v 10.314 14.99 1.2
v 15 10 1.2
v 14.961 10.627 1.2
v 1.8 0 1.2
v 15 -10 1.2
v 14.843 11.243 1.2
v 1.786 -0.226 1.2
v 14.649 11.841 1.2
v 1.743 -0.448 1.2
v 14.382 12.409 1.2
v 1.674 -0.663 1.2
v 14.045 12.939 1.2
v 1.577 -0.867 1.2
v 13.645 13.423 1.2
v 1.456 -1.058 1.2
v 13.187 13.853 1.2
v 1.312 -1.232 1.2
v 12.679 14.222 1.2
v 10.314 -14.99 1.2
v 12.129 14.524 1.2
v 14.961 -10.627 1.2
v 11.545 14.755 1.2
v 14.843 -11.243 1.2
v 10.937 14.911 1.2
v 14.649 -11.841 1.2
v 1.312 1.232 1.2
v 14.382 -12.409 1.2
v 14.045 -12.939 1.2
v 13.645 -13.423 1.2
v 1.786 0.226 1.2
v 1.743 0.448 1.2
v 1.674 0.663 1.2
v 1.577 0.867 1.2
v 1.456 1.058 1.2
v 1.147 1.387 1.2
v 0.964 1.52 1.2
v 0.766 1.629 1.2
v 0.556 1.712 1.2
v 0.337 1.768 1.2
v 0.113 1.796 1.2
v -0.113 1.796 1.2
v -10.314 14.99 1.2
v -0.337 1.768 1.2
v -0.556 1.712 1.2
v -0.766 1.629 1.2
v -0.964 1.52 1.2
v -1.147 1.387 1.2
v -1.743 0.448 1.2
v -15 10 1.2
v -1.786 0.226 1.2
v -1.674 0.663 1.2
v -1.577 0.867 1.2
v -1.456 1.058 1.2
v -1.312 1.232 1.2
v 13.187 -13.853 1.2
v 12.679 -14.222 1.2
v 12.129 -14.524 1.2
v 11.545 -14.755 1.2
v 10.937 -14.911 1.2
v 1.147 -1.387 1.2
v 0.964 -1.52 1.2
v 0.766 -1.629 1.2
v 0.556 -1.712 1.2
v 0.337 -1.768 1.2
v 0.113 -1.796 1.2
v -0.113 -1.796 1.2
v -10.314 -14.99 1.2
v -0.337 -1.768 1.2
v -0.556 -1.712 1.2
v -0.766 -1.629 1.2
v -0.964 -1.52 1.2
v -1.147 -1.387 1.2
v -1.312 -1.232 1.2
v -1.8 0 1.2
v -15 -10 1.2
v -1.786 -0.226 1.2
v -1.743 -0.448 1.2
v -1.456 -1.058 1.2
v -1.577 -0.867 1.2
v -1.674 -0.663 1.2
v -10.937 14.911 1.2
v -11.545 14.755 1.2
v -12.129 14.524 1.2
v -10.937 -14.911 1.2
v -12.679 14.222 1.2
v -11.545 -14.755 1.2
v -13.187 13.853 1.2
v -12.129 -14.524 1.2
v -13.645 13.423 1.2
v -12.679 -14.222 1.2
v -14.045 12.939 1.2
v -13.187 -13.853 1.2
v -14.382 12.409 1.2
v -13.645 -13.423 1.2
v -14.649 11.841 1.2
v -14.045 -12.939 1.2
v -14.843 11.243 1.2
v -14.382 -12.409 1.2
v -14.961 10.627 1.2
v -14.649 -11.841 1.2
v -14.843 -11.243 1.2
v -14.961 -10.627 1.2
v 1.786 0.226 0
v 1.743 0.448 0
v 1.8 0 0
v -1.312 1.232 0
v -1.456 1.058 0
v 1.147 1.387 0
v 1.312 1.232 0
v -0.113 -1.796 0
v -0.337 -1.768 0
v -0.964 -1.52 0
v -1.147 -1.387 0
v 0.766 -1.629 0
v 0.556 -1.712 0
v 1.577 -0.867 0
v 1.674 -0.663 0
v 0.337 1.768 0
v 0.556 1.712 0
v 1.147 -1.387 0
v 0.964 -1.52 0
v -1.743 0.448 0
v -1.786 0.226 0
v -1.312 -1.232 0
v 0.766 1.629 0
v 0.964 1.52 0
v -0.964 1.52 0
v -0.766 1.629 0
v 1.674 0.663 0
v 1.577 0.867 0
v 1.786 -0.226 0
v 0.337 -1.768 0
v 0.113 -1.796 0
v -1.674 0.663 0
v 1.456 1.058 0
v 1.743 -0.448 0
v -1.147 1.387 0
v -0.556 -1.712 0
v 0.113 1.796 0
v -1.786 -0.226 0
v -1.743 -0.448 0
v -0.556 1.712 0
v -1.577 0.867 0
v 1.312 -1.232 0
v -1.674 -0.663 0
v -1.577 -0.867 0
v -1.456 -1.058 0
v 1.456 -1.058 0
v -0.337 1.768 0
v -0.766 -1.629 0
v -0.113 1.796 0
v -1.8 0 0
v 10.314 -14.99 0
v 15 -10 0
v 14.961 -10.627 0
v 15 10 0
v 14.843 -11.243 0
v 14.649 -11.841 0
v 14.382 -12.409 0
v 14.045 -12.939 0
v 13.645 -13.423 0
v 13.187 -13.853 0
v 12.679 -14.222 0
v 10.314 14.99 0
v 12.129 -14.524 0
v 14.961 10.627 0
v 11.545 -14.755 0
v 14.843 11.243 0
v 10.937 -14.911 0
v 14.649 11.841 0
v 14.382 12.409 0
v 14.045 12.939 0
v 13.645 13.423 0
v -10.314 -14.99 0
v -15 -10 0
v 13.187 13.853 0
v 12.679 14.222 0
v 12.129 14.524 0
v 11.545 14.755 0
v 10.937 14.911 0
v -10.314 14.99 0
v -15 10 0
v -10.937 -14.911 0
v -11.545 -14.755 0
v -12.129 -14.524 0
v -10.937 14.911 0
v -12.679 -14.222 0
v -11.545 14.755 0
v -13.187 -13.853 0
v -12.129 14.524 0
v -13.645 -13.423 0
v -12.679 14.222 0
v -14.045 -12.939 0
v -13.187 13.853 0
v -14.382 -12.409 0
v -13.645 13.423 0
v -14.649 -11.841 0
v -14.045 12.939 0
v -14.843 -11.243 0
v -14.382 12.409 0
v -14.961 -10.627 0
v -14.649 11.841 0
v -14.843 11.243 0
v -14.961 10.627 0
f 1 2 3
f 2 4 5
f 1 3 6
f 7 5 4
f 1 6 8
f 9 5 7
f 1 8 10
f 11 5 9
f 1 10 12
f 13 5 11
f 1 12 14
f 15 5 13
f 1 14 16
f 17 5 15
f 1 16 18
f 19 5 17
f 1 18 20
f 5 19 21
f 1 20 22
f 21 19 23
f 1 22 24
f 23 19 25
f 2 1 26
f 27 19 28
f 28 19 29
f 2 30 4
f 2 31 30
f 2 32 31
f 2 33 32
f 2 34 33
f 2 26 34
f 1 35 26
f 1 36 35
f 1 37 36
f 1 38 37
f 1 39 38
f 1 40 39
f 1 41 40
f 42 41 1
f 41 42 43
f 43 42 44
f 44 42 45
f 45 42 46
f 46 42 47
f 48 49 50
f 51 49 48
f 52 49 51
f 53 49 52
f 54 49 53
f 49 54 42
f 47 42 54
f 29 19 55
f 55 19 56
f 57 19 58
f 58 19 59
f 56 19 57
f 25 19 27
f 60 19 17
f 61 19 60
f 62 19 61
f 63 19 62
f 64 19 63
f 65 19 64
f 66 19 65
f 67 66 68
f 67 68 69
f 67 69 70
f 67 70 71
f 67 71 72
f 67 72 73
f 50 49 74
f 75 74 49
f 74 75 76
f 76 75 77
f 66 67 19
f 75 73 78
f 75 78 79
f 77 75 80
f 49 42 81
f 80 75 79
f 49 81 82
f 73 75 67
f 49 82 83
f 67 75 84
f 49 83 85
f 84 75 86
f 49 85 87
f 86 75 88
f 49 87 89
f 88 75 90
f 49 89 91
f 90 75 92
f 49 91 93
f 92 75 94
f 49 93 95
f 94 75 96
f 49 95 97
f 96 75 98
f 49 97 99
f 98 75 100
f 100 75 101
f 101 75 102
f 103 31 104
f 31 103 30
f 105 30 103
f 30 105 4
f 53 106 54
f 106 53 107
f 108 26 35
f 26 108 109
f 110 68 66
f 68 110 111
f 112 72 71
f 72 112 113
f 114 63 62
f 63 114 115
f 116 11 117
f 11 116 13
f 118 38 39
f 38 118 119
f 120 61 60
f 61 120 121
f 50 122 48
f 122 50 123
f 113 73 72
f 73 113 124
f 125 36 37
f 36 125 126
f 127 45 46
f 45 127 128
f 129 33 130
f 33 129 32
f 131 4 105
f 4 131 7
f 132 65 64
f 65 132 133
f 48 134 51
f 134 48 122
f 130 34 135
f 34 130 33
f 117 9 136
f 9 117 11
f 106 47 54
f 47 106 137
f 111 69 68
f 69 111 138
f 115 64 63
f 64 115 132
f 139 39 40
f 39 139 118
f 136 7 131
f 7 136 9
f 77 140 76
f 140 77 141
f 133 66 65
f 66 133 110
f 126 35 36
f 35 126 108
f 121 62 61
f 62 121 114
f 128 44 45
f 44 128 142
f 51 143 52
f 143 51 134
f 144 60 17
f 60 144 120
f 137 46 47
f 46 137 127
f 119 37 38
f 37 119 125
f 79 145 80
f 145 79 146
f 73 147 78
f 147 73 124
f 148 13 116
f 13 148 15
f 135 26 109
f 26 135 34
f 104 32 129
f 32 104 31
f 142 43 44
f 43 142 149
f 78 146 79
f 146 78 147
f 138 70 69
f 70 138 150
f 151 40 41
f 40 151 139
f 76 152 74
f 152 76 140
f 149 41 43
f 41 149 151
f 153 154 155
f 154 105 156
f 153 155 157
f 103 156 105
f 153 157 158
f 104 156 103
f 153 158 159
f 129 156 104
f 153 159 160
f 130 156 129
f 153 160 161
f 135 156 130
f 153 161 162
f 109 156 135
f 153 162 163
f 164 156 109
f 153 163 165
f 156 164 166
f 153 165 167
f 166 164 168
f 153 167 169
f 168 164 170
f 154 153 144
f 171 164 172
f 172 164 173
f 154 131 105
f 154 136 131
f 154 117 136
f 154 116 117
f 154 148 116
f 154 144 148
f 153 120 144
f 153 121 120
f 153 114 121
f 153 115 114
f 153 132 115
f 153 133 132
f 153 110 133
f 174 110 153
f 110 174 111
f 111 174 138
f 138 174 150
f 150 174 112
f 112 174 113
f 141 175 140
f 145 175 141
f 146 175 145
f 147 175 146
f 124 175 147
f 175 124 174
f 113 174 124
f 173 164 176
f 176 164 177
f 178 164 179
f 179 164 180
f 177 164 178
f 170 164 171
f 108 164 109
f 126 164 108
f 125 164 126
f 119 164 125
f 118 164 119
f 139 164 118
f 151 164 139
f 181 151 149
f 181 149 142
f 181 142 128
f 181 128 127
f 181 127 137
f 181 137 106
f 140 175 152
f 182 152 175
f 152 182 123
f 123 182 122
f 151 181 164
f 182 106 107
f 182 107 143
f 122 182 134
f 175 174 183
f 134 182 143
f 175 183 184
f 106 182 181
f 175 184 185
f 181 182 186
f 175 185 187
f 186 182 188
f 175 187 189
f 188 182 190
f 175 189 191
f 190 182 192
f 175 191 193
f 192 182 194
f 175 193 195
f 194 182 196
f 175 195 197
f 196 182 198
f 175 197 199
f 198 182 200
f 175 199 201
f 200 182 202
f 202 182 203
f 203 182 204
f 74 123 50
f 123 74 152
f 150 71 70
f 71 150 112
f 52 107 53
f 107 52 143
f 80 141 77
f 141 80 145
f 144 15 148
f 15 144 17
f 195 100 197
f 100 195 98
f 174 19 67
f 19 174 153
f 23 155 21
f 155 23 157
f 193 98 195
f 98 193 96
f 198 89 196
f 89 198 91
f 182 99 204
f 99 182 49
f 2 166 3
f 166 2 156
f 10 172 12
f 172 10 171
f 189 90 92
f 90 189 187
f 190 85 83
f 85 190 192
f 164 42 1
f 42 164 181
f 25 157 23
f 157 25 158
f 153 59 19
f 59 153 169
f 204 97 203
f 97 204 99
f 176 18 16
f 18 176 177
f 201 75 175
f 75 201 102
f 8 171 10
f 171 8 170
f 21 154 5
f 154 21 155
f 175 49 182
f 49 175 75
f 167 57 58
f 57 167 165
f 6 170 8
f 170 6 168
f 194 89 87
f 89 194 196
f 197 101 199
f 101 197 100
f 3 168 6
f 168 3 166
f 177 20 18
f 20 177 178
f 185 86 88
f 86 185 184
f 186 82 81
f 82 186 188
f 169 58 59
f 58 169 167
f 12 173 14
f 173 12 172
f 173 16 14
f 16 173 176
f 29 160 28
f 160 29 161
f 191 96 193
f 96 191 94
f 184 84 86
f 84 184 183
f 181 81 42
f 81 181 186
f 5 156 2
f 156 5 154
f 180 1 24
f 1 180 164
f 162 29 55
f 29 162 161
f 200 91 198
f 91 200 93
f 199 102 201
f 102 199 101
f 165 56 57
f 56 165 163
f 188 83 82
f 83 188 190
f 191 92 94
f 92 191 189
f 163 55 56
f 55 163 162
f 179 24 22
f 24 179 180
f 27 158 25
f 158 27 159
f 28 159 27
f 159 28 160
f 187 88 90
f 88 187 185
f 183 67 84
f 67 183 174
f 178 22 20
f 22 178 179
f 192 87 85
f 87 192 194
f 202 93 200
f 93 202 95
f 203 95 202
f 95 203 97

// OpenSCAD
$fn = 50;


difference() {
	union() {
		hull() {
			translate(v = [-10.0000000000, 10.0000000000, 0]) {
				cylinder(h = 12, r = 5);
			}
			translate(v = [10.0000000000, 10.0000000000, 0]) {
				cylinder(h = 12, r = 5);
			}
			translate(v = [-10.0000000000, -10.0000000000, 0]) {
				cylinder(h = 12, r = 5);
			}
			translate(v = [10.0000000000, -10.0000000000, 0]) {
				cylinder(h = 12, r = 5);
			}
		}
	}
	union() {
		translate(v = [0, 0, 1.2000000000]) {
			hull() {
				translate(v = [-10.0000000000, 10.0000000000, 0]) {
					cylinder(h = 10.8000000000, r = 3.8000000000);
				}
				translate(v = [10.0000000000, 10.0000000000, 0]) {
					cylinder(h = 10.8000000000, r = 3.8000000000);
				}
				translate(v = [-10.0000000000, -10.0000000000, 0]) {
					cylinder(h = 10.8000000000, r = 3.8000000000);
				}
				translate(v = [10.0000000000, -10.0000000000, 0]) {
					cylinder(h = 10.8000000000, r = 3.8000000000);
				}
			}
		}
		#cylinder(h = 1.2000000000, r = 1.8000000000);
		translate(v = [-250.0000000000, -250.0000000000, 1.2000000000]) {
			cube(size = [500, 500, 500]);
		}
		translate(v = [-250.0000000000, -250.0000000000, 1.2000000000]) {
			cube(size = [500, 500, 500]);
		}
		translate(v = [-250.0000000000, -250.0000000000, 1.2000000000]) {
			cube(size = [500, 500, 500]);
		}
	}
}
